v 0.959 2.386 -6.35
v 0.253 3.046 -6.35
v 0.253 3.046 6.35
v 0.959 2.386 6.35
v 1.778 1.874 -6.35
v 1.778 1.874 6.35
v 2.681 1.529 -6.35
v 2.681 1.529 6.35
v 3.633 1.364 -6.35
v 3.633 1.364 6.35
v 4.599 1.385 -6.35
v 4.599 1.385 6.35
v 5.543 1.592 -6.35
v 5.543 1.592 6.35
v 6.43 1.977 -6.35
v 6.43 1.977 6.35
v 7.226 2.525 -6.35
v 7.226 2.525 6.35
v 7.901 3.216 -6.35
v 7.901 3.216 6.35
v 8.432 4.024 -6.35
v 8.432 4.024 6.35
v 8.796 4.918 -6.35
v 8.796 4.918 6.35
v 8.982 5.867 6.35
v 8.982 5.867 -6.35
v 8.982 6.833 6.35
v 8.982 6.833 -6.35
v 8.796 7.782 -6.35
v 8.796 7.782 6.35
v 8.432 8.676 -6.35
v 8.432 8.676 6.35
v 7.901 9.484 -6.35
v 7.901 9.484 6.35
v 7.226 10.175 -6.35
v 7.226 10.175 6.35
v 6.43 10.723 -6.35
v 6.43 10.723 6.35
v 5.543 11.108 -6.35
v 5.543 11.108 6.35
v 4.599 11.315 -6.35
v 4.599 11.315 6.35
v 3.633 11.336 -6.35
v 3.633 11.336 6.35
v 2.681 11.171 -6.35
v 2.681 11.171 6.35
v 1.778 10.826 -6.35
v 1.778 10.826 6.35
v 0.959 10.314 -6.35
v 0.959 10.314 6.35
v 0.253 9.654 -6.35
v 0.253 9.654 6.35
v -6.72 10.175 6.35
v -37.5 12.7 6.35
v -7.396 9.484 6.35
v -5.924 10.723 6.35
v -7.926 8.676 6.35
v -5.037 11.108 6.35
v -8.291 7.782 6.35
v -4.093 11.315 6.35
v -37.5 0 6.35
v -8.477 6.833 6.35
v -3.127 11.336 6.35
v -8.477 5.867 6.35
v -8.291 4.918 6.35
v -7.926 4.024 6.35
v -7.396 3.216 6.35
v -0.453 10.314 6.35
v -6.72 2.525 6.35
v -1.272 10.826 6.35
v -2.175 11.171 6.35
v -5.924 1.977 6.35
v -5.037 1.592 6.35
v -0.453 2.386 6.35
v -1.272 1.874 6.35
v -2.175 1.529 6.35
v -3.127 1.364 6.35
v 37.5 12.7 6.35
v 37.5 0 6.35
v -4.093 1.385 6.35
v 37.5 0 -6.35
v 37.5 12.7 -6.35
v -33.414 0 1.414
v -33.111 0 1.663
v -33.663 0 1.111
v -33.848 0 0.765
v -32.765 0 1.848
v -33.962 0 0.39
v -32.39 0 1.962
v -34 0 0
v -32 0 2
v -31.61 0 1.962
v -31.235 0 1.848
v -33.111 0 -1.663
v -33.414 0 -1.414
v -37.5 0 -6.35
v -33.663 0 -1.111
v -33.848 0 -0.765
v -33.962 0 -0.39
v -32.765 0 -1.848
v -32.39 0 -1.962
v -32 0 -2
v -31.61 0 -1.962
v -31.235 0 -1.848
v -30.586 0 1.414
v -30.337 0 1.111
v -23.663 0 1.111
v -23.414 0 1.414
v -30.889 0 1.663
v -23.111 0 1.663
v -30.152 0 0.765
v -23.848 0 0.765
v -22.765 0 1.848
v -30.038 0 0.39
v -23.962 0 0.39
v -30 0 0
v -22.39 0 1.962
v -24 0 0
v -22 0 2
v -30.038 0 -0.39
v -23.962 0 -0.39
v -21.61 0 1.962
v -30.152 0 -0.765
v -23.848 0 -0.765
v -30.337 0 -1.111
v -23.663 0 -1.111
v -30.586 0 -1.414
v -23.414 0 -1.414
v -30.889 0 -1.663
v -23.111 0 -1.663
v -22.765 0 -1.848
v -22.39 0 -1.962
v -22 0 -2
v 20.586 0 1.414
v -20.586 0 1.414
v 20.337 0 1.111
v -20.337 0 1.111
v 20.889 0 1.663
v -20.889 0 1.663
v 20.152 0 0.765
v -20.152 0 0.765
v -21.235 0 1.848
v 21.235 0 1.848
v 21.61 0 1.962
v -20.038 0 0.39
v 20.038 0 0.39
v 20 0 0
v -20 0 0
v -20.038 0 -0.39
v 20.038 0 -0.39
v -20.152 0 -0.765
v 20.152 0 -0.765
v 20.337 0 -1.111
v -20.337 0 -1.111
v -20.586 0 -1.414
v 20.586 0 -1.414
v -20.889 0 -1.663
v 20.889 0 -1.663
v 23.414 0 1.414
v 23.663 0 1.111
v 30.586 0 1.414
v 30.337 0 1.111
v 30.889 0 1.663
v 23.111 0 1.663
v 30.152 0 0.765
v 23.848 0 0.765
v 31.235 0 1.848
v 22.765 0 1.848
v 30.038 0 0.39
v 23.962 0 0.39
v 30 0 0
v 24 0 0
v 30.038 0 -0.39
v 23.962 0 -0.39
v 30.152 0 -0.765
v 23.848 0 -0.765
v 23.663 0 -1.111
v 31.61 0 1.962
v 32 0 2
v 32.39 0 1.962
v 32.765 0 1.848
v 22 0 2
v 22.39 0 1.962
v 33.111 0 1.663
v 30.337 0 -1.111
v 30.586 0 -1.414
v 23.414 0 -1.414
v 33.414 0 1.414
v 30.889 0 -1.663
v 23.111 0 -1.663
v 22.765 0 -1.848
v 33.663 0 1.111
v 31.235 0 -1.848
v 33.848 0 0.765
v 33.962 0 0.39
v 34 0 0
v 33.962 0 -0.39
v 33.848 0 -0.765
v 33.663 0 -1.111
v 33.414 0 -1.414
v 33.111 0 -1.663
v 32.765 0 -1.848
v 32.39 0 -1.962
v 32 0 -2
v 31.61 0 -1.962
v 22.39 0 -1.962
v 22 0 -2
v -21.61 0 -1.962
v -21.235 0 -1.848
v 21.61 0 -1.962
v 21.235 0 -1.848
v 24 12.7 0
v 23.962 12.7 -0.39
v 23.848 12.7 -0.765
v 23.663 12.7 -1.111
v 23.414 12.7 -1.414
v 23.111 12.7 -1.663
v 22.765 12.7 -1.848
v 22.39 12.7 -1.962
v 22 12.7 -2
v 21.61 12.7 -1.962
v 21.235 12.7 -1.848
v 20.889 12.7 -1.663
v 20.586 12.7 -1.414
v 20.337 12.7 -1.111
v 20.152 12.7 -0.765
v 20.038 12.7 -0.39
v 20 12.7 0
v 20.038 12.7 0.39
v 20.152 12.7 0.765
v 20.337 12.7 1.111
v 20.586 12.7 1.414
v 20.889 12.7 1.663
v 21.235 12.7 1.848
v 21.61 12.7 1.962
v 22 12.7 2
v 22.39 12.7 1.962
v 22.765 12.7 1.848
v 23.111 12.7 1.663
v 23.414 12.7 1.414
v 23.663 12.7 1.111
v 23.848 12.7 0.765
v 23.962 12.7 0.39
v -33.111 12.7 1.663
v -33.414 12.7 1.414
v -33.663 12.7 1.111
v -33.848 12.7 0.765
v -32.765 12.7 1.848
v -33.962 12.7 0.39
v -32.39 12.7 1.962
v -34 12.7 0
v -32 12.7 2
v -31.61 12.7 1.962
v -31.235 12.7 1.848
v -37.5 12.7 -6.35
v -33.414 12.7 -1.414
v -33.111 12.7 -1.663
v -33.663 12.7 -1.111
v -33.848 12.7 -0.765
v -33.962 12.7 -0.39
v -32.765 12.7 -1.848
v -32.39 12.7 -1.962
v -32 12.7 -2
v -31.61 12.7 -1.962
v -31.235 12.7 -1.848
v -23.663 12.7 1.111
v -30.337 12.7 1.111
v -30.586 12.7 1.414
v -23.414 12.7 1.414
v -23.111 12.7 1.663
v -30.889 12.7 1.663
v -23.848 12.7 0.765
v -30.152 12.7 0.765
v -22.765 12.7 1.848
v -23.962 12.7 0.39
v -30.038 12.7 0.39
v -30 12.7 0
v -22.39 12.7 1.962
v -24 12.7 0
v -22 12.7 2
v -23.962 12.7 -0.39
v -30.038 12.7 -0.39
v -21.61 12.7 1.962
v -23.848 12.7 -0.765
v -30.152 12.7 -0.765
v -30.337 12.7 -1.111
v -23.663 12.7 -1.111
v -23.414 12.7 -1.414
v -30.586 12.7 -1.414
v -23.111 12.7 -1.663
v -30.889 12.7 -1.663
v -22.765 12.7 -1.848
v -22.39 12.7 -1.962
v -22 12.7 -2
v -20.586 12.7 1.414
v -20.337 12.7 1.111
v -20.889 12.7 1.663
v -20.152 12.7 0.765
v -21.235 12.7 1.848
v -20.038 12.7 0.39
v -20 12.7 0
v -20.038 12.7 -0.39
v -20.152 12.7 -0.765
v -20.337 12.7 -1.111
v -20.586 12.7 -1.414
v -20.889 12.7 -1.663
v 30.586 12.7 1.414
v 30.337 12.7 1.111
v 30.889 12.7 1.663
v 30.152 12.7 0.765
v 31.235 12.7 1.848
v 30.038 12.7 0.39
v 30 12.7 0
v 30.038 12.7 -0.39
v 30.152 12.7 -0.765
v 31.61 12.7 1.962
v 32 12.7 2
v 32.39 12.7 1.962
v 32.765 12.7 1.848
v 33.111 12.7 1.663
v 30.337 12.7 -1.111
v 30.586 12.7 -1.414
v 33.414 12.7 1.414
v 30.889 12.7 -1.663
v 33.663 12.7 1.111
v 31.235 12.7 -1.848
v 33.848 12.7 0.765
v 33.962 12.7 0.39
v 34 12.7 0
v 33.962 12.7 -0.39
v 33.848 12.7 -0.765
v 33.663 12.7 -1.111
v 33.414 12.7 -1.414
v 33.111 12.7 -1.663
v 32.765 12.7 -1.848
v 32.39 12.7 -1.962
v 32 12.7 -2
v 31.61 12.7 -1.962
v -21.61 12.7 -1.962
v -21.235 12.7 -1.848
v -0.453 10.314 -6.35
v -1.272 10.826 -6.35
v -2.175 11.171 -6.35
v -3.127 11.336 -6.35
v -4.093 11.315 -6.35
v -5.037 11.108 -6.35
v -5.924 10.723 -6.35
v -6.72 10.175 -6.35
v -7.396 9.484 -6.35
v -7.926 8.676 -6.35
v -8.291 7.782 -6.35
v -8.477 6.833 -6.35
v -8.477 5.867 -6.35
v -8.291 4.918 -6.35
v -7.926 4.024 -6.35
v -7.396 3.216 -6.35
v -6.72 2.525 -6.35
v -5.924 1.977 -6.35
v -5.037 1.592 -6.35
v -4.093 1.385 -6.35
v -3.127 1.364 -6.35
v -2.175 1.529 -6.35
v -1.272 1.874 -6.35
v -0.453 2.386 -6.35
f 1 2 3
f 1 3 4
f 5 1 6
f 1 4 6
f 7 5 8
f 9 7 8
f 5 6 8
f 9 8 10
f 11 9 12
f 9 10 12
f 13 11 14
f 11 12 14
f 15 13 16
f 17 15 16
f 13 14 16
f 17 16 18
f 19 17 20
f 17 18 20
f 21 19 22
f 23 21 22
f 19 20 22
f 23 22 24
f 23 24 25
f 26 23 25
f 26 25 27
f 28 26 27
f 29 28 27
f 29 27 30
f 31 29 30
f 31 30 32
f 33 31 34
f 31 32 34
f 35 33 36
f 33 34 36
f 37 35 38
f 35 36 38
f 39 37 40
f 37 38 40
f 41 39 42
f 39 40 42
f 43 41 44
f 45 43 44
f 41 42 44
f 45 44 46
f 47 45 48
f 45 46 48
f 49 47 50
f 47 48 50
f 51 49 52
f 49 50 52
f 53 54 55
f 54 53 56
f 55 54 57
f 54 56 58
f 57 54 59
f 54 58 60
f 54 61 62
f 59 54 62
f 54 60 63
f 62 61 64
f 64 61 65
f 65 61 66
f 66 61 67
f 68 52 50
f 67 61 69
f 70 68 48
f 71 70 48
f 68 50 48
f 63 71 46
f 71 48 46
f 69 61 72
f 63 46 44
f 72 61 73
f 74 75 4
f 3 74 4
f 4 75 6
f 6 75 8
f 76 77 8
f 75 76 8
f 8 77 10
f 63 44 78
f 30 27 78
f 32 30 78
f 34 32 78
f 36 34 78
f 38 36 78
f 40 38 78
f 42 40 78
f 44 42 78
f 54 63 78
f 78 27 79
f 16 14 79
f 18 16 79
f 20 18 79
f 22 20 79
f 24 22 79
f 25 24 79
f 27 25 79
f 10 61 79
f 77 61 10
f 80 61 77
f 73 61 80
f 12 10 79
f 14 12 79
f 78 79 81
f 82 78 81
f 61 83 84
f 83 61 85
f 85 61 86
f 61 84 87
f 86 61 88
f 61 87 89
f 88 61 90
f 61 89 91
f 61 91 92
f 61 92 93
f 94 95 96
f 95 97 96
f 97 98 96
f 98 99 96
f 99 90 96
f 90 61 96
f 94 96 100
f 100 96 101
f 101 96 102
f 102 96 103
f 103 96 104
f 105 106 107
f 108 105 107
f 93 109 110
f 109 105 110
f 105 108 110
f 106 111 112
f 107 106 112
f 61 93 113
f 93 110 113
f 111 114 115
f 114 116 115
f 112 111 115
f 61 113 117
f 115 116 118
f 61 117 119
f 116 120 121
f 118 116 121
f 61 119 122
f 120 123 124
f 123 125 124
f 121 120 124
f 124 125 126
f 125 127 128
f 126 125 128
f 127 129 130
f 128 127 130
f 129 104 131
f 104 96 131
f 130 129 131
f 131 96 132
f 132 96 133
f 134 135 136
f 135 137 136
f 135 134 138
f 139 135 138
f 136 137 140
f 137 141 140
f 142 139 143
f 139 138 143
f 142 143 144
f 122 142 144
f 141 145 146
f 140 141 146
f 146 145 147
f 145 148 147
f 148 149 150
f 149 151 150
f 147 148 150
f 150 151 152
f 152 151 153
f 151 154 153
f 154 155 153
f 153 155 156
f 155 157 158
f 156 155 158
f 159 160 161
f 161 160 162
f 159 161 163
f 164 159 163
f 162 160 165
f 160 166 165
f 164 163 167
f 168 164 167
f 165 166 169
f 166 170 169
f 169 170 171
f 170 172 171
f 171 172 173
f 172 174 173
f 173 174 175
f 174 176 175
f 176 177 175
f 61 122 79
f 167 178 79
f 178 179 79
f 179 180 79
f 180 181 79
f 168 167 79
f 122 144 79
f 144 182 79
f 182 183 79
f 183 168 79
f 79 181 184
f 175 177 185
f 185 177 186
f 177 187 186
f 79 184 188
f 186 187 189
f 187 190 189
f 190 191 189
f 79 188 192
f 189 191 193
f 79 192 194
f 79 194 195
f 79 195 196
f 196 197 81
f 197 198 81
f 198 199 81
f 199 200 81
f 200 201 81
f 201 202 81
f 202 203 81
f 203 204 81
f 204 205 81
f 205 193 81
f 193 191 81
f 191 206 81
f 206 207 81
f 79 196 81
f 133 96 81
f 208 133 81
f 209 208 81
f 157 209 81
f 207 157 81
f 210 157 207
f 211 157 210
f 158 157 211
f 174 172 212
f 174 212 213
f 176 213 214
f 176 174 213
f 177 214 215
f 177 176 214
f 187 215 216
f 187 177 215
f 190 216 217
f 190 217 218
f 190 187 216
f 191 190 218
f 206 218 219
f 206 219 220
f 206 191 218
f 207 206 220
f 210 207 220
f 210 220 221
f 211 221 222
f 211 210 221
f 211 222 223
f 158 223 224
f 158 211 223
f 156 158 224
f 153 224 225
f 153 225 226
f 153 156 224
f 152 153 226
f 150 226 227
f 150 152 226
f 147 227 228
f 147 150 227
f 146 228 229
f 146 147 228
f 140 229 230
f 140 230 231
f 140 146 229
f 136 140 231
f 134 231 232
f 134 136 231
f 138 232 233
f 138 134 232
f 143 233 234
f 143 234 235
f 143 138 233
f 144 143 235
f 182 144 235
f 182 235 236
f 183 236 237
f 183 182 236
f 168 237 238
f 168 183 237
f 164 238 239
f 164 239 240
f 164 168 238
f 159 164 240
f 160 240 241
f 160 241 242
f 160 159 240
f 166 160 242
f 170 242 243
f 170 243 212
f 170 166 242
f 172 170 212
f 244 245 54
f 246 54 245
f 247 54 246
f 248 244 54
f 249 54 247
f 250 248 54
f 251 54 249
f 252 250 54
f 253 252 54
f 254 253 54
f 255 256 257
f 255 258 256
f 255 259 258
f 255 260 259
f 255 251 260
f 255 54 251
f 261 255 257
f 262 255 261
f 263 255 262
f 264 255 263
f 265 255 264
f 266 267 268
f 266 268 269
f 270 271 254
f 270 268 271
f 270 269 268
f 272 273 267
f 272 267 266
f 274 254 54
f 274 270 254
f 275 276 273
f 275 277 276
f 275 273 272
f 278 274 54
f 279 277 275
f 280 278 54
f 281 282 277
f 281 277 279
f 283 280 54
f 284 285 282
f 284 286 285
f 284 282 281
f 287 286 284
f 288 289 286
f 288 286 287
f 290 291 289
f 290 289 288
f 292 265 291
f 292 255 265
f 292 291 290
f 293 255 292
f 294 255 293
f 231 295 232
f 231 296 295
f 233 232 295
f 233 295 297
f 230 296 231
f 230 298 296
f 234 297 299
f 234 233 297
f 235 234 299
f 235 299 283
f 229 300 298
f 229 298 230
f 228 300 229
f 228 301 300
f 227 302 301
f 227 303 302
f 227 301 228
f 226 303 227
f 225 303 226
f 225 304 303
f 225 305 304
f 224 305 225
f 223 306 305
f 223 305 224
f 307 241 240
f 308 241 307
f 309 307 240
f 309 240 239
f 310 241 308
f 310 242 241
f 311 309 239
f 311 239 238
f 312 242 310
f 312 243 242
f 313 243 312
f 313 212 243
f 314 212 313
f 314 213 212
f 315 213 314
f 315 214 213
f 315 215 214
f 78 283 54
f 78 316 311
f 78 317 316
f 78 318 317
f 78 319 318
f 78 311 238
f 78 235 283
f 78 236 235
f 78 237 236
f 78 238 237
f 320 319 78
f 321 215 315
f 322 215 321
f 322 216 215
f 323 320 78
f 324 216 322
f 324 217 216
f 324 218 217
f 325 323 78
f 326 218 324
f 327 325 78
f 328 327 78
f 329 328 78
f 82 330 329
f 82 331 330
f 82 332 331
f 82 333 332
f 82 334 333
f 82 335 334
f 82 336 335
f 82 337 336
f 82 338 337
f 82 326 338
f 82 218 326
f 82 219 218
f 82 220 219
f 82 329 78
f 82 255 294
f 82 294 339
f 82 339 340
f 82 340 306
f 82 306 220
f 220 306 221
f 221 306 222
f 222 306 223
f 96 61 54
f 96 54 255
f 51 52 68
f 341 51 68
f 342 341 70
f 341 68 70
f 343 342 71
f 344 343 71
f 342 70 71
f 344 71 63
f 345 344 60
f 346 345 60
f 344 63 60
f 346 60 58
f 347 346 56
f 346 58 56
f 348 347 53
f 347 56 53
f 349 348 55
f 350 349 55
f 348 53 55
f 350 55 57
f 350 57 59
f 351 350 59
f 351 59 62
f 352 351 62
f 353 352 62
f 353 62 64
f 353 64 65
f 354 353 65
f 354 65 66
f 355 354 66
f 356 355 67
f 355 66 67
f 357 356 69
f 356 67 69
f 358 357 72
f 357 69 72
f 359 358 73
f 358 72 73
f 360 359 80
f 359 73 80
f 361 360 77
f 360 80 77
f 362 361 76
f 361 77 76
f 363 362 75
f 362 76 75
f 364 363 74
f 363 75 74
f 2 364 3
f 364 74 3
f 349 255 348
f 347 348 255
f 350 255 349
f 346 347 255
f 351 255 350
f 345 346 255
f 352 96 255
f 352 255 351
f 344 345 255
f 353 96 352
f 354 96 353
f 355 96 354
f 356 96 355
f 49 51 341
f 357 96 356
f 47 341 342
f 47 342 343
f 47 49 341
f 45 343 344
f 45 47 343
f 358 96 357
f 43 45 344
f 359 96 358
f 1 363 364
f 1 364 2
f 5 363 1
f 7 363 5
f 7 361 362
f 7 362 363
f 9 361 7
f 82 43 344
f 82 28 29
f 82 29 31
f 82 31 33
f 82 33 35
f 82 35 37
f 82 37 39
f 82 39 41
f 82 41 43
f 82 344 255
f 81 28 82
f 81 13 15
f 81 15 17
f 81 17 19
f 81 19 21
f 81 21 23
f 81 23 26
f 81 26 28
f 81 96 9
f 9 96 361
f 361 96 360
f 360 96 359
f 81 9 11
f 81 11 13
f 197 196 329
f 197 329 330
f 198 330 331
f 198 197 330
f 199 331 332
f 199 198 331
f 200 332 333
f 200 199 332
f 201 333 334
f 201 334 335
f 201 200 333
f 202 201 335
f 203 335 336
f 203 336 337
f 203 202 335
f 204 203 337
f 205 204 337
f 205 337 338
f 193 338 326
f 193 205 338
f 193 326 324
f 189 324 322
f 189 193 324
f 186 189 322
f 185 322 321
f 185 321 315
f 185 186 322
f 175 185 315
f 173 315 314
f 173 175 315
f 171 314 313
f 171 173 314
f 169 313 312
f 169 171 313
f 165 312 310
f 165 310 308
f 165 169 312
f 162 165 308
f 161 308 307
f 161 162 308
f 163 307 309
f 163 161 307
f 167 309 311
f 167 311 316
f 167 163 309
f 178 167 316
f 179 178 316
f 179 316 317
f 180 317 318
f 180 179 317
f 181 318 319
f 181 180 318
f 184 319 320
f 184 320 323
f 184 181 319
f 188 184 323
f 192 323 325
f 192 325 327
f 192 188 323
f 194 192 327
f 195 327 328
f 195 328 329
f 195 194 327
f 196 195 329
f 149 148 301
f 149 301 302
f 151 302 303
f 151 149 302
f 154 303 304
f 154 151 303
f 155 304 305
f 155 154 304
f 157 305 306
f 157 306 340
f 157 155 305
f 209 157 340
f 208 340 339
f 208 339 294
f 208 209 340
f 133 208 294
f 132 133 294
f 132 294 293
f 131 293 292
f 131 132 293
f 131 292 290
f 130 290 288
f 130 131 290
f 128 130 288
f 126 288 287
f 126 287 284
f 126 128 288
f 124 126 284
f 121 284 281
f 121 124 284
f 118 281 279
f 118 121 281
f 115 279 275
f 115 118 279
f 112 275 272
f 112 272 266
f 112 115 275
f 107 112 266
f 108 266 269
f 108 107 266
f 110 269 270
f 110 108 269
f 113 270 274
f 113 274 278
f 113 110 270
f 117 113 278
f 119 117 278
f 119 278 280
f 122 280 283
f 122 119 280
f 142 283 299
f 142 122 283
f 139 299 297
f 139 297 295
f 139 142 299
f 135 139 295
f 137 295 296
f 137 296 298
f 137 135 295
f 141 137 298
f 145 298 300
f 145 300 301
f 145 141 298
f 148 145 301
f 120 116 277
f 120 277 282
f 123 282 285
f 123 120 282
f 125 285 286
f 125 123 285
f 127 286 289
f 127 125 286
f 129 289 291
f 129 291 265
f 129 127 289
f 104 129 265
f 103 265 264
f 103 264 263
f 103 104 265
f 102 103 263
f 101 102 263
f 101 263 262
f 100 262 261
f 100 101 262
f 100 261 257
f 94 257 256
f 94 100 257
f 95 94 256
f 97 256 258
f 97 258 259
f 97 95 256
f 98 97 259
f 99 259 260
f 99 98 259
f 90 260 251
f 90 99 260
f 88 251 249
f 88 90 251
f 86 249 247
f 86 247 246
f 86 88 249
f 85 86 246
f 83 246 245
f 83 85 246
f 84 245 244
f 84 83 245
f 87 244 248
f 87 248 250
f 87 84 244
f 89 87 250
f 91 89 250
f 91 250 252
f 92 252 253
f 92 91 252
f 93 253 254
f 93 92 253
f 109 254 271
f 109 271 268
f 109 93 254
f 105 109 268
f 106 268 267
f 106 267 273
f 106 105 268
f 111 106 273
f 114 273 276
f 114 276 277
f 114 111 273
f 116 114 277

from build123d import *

# Parameters (mm, degrees)
SKETCH1_W           = 75
SKETCH1_H           = 12.7
SKETCH1_R           = 2
BOSS_EXTRUDE1_DEPTH = 12.7
SKETCH2_R           = 5
CUT_EXTRUDE1_DEPTH  = 12.7


with BuildPart() as part:
    # Sketch1 → Boss-Extrude1 (new body)
    with BuildSketch(Plane(origin=(0, 0, 0), x_dir=(1, 0, 0), z_dir=(0, 1, 0))):
        Rectangle(SKETCH1_W, SKETCH1_H)
        with Locations((-32, 0)):
            Circle(SKETCH1_R, mode=Mode.SUBTRACT)
        with Locations((-22, 0)):
            Circle(SKETCH1_R, mode=Mode.SUBTRACT)
        with Locations((22, 0)):
            Circle(SKETCH1_R, mode=Mode.SUBTRACT)
        with Locations((32, 0)):
            Circle(SKETCH1_R, mode=Mode.SUBTRACT)
    extrude(amount=BOSS_EXTRUDE1_DEPTH)

    # Sketch2 → Cut-Extrude1 (cut)
    with BuildSketch(Plane.XY.offset(6.35)):
        with Locations((-3.5, 6.35)):
            Circle(SKETCH2_R)
        with Locations((4.005771179, 6.35)):
            Circle(SKETCH2_R)
    extrude(amount=-CUT_EXTRUDE1_DEPTH, mode=Mode.SUBTRACT)


solid = part.part
